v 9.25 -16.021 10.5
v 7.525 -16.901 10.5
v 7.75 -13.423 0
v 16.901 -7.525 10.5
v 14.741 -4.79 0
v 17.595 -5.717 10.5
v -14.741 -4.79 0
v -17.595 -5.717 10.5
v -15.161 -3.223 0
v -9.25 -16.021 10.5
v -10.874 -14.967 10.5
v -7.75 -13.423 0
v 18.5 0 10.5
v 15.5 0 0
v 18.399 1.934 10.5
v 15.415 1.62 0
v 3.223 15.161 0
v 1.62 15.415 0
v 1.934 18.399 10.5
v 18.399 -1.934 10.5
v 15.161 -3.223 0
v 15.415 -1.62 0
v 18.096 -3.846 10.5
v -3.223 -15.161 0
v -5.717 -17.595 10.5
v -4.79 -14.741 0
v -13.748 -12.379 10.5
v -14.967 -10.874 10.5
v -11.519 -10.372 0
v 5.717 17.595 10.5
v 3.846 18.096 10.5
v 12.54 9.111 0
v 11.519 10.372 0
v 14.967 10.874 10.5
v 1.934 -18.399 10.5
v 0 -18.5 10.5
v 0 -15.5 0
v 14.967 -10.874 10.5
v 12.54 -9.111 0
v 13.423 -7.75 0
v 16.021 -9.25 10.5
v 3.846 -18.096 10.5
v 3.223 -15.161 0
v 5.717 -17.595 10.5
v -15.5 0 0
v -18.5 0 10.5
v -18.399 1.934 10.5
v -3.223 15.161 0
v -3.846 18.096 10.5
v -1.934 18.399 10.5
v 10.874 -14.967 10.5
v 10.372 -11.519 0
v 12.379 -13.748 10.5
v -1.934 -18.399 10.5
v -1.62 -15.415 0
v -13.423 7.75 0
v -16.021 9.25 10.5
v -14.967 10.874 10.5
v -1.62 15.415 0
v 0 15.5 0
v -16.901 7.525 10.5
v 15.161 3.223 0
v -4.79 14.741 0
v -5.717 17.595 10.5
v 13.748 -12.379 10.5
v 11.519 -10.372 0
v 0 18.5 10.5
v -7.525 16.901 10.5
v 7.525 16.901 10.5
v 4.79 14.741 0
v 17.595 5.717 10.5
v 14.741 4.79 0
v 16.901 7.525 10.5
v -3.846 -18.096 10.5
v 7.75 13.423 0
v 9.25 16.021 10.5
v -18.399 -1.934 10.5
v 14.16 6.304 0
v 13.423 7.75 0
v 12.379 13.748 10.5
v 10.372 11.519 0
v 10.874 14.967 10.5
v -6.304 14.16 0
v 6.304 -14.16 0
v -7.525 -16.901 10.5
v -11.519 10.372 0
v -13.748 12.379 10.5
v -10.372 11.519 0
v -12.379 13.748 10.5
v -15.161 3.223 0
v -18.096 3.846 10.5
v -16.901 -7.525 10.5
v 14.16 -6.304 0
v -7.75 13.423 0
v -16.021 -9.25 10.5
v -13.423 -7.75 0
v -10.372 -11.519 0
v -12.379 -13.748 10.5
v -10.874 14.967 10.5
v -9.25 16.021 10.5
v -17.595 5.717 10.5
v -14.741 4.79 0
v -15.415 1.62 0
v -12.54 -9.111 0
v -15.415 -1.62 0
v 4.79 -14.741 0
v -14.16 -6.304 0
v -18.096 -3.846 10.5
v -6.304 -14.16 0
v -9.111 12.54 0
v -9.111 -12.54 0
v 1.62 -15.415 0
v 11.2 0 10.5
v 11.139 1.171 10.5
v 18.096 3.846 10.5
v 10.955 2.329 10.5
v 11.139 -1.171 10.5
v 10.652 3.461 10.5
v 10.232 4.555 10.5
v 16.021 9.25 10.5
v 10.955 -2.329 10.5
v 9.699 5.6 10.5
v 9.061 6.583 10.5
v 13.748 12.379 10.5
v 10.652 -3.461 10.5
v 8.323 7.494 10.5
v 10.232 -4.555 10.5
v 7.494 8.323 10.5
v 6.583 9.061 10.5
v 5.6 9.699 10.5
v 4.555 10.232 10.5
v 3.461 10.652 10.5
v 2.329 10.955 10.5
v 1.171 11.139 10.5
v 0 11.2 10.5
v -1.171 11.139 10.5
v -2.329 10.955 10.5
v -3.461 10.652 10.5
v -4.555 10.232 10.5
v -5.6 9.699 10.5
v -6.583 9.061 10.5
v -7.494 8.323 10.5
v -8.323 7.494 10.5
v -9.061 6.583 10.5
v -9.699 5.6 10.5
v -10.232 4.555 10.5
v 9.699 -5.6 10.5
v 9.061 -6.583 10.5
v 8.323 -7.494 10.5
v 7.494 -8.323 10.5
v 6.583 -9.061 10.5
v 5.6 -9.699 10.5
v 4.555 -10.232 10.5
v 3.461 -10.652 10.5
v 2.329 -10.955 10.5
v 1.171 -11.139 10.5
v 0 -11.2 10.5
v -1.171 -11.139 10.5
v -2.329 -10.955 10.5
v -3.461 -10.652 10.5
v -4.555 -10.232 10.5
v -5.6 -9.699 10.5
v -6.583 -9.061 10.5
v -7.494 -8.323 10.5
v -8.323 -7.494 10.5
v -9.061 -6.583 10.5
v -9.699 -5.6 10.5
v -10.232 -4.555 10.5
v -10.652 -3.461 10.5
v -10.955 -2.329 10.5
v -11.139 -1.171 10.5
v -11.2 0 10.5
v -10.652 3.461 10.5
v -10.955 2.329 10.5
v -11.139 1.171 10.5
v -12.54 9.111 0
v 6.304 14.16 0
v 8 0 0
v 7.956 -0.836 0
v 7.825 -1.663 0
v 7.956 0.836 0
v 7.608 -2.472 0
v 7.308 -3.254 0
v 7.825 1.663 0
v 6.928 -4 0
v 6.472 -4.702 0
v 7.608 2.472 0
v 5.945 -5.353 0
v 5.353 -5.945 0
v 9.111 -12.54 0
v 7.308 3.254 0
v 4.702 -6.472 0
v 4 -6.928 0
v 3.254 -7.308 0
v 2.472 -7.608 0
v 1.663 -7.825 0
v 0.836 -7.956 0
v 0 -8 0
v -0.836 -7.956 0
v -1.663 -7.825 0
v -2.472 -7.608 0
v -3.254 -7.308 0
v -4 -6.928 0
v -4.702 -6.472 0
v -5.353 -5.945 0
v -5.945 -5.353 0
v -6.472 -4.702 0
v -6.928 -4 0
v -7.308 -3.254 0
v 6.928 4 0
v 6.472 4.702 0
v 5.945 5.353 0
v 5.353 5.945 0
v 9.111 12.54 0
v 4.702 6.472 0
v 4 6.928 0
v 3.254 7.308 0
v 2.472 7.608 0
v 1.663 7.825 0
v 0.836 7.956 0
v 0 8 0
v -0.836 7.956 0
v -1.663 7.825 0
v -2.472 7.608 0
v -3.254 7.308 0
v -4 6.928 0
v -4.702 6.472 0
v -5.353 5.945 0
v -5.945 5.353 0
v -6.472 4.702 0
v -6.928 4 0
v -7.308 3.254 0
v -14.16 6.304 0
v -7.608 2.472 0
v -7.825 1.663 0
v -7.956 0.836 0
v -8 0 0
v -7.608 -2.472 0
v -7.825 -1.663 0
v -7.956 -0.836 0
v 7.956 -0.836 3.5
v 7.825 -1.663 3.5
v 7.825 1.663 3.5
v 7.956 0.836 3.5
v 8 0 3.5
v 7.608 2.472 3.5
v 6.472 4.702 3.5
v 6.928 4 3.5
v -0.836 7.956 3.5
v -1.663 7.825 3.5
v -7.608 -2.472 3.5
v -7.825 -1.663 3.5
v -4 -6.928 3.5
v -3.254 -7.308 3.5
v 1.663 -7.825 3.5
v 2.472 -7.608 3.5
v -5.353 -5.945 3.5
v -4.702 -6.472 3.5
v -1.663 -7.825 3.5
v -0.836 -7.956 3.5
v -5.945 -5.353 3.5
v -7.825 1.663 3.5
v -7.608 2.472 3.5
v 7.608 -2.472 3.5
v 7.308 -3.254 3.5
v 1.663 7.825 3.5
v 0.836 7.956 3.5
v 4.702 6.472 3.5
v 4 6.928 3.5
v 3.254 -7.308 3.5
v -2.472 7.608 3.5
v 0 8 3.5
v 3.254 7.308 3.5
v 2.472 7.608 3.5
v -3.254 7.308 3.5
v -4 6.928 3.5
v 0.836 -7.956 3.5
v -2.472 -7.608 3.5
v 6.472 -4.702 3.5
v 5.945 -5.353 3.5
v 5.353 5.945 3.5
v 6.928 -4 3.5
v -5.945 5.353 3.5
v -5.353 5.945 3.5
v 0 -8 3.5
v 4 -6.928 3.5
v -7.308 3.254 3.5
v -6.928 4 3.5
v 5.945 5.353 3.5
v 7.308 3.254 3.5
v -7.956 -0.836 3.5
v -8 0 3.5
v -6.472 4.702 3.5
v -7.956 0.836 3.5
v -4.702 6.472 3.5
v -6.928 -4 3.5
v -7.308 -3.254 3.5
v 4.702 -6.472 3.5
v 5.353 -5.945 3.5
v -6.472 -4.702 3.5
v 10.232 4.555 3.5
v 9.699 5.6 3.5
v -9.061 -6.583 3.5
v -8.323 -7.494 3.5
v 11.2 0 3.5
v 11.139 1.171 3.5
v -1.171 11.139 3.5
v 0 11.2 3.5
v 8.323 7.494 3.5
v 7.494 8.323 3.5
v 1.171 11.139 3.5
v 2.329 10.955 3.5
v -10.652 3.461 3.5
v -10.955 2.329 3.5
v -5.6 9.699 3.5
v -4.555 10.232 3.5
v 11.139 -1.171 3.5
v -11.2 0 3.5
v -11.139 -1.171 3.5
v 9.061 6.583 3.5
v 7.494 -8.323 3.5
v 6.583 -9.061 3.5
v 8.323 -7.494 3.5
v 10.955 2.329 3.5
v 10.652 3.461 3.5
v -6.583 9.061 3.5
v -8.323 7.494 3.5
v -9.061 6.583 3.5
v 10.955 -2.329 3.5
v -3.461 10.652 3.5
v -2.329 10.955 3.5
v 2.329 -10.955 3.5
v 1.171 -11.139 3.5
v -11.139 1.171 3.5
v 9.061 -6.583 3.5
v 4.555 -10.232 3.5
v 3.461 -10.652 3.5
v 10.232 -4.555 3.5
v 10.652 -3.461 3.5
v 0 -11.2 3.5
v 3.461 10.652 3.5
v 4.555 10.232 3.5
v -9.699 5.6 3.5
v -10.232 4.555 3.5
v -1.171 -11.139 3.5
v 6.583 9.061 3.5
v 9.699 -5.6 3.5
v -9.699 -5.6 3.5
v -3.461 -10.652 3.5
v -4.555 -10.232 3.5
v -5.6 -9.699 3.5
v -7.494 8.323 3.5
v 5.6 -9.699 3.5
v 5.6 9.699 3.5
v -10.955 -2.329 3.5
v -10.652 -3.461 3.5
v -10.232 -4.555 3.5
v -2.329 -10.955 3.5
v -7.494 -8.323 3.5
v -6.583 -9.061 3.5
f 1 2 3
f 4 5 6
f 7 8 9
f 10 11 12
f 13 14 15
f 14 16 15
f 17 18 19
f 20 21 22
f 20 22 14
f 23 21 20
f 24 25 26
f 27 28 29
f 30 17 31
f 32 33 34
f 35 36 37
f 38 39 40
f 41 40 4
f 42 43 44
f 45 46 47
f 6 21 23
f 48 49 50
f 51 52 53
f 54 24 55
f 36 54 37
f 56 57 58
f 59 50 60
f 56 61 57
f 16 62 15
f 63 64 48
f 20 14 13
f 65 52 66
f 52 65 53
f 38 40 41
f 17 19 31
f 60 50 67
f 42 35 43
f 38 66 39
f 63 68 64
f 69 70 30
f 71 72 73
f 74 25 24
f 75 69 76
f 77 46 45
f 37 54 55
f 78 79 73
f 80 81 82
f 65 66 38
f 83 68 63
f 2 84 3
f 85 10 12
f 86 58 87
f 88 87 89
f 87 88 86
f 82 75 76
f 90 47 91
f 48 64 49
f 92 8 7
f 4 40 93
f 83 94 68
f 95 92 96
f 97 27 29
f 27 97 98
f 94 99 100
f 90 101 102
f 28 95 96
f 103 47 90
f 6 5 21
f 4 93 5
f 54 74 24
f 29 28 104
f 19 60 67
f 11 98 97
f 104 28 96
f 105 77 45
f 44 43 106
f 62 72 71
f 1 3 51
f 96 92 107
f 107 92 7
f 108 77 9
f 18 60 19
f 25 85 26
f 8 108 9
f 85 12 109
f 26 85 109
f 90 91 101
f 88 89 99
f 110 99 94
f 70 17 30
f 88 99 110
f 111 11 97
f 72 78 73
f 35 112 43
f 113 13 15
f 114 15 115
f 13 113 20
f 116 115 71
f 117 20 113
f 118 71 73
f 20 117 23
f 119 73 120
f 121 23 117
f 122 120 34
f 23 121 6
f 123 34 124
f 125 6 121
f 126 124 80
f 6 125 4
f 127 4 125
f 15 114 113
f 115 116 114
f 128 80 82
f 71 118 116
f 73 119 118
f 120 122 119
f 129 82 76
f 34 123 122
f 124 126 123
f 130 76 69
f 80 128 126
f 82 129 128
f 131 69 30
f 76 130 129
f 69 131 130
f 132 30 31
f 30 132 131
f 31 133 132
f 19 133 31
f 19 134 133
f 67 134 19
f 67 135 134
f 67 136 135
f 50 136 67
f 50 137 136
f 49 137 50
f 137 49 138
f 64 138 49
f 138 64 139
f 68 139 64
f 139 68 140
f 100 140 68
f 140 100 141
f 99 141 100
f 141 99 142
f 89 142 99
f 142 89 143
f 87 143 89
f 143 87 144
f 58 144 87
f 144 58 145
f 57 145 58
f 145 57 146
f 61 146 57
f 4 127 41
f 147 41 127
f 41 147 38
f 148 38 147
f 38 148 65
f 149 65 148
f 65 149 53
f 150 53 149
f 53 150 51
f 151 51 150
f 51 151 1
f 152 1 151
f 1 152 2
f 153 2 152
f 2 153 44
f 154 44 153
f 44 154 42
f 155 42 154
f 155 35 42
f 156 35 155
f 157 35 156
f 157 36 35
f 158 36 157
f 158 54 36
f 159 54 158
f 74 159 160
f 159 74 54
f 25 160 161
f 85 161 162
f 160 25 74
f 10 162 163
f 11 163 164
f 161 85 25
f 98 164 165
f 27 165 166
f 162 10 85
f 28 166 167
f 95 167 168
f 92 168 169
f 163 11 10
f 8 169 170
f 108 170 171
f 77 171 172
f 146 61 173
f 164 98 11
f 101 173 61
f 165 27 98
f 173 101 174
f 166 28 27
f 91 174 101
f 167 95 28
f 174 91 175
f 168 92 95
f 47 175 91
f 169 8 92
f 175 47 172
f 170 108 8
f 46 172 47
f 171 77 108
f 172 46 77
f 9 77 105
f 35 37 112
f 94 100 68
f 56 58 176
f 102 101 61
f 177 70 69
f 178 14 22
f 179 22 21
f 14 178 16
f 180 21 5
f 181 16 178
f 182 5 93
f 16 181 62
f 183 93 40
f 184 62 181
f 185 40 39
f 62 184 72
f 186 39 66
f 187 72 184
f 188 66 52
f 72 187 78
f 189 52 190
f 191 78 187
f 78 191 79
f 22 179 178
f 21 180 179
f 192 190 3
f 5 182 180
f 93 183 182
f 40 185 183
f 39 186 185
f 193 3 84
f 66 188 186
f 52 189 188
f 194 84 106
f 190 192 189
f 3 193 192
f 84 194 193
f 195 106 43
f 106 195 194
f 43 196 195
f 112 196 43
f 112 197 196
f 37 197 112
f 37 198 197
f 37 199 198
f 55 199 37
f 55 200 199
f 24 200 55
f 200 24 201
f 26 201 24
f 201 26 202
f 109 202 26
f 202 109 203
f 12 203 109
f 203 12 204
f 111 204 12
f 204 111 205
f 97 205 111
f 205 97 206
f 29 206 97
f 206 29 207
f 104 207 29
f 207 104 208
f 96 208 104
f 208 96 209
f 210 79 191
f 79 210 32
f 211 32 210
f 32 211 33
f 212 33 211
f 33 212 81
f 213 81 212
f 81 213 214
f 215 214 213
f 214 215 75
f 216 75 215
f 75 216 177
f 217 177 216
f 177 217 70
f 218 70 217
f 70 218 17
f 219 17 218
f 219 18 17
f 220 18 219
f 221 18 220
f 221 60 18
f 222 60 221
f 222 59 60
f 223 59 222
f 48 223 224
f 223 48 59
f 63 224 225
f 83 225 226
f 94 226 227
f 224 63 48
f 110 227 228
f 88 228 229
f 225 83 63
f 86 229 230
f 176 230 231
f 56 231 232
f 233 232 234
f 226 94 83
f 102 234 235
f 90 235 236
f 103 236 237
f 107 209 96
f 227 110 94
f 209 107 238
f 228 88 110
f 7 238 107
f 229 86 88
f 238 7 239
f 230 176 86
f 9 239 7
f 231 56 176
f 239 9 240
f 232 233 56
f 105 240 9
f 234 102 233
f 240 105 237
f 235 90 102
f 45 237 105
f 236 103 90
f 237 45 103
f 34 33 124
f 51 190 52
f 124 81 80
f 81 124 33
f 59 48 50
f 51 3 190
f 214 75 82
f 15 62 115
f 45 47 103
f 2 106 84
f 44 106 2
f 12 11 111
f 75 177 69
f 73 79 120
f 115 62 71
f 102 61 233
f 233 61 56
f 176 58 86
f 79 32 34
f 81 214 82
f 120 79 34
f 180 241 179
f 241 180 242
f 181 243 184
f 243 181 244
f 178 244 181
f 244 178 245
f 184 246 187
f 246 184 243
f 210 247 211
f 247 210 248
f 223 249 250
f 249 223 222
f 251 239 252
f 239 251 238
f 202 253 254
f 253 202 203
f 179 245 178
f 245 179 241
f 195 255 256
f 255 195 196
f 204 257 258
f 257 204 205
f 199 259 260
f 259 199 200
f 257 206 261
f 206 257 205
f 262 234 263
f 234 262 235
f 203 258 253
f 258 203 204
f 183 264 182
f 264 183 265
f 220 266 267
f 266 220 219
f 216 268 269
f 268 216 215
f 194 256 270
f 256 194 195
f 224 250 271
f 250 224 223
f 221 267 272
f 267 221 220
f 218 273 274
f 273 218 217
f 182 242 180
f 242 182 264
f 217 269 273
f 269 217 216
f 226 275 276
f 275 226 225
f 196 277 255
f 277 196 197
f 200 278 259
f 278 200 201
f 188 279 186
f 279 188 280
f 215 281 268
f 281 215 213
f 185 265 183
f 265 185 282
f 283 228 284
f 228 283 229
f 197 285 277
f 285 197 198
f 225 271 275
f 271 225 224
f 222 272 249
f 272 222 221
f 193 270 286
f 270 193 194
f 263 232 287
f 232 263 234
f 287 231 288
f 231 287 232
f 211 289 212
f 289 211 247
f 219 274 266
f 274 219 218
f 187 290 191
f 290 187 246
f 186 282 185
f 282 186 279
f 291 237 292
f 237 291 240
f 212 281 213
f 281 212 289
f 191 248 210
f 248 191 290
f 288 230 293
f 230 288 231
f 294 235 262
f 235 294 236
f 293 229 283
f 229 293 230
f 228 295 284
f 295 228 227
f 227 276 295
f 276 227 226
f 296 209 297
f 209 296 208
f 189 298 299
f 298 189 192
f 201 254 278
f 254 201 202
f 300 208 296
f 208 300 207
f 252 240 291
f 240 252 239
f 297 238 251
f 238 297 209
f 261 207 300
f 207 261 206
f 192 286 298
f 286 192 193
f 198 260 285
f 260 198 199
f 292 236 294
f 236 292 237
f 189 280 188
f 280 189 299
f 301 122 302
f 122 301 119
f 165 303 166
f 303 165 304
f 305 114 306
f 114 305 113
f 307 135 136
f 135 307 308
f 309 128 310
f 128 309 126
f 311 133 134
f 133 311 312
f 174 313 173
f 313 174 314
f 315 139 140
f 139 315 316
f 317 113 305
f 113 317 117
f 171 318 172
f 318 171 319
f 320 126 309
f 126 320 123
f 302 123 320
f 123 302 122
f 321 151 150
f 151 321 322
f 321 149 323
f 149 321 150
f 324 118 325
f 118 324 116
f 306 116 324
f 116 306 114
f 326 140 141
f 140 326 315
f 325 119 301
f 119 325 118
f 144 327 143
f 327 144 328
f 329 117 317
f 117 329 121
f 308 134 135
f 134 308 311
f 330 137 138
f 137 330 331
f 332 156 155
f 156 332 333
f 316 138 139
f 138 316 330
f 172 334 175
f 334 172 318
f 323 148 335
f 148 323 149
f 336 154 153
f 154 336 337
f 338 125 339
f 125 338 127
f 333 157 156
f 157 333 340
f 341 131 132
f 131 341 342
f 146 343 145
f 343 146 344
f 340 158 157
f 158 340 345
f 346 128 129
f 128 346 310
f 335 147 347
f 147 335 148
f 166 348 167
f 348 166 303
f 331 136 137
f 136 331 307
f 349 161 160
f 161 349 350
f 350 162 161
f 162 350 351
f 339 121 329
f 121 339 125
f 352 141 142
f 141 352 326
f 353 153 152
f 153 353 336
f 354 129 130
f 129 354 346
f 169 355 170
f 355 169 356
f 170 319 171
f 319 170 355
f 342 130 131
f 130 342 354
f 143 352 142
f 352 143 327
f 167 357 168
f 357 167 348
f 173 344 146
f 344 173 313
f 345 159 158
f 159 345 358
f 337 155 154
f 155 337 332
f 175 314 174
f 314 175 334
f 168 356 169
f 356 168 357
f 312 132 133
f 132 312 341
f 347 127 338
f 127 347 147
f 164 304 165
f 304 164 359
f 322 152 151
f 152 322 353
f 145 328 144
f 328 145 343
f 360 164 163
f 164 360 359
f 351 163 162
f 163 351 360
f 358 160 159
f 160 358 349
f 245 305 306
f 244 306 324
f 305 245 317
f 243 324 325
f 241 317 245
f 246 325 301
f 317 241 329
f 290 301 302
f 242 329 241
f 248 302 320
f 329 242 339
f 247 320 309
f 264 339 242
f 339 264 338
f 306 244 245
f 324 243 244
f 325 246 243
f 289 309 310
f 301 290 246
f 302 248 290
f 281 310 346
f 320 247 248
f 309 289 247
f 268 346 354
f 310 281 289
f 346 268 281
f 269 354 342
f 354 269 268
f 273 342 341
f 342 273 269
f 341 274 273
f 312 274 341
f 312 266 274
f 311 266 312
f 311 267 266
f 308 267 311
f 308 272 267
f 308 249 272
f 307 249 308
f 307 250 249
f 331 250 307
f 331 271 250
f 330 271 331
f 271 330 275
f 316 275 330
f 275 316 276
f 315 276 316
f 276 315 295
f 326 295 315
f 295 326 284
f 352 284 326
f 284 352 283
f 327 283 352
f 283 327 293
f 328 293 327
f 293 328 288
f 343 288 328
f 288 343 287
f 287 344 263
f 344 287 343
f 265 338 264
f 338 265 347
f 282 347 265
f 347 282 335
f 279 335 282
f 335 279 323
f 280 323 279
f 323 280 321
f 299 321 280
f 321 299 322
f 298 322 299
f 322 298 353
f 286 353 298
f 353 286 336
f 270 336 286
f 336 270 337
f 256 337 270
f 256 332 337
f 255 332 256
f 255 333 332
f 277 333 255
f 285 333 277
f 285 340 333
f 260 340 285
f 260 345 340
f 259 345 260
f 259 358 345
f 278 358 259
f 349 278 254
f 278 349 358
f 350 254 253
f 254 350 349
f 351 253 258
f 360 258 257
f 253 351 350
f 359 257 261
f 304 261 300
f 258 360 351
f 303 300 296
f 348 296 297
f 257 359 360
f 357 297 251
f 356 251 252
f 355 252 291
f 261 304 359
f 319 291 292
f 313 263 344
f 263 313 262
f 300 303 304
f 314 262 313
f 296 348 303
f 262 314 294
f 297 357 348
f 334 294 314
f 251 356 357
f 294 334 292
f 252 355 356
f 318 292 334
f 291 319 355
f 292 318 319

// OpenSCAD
//spool holder for bearings

//diameter of spool center hole in mm
spool_bore=35;

//outer diameter of bearing in mm(22mm for skate bearings)
bearing_diameter=22;

//center bore of bearing in mm (8mm for skate bearings/m8)
bearing_bore=8;

//depth of bearing (width) in mm
bearing_depth=7;

//width of flange holding bearing in place
bearing_rim=3;


spool_rad=spool_bore/2;
clearance_rad=(bearing_diameter-(2*bearing_rim))/2;
bearing_rad=(bearing_diameter/2)+0.2;
difference (){
  cylinder (bearing_depth*1.5,spool_rad-2,spool_rad+1,$fn=60);
  cylinder (bearing_depth*4,clearance_rad,clearance_rad, center=true,$fn=60);
  translate ([0,0,bearing_depth*0.5]) cylinder (bearing_depth+1,bearing_rad,bearing_rad, $fn=60);
}
